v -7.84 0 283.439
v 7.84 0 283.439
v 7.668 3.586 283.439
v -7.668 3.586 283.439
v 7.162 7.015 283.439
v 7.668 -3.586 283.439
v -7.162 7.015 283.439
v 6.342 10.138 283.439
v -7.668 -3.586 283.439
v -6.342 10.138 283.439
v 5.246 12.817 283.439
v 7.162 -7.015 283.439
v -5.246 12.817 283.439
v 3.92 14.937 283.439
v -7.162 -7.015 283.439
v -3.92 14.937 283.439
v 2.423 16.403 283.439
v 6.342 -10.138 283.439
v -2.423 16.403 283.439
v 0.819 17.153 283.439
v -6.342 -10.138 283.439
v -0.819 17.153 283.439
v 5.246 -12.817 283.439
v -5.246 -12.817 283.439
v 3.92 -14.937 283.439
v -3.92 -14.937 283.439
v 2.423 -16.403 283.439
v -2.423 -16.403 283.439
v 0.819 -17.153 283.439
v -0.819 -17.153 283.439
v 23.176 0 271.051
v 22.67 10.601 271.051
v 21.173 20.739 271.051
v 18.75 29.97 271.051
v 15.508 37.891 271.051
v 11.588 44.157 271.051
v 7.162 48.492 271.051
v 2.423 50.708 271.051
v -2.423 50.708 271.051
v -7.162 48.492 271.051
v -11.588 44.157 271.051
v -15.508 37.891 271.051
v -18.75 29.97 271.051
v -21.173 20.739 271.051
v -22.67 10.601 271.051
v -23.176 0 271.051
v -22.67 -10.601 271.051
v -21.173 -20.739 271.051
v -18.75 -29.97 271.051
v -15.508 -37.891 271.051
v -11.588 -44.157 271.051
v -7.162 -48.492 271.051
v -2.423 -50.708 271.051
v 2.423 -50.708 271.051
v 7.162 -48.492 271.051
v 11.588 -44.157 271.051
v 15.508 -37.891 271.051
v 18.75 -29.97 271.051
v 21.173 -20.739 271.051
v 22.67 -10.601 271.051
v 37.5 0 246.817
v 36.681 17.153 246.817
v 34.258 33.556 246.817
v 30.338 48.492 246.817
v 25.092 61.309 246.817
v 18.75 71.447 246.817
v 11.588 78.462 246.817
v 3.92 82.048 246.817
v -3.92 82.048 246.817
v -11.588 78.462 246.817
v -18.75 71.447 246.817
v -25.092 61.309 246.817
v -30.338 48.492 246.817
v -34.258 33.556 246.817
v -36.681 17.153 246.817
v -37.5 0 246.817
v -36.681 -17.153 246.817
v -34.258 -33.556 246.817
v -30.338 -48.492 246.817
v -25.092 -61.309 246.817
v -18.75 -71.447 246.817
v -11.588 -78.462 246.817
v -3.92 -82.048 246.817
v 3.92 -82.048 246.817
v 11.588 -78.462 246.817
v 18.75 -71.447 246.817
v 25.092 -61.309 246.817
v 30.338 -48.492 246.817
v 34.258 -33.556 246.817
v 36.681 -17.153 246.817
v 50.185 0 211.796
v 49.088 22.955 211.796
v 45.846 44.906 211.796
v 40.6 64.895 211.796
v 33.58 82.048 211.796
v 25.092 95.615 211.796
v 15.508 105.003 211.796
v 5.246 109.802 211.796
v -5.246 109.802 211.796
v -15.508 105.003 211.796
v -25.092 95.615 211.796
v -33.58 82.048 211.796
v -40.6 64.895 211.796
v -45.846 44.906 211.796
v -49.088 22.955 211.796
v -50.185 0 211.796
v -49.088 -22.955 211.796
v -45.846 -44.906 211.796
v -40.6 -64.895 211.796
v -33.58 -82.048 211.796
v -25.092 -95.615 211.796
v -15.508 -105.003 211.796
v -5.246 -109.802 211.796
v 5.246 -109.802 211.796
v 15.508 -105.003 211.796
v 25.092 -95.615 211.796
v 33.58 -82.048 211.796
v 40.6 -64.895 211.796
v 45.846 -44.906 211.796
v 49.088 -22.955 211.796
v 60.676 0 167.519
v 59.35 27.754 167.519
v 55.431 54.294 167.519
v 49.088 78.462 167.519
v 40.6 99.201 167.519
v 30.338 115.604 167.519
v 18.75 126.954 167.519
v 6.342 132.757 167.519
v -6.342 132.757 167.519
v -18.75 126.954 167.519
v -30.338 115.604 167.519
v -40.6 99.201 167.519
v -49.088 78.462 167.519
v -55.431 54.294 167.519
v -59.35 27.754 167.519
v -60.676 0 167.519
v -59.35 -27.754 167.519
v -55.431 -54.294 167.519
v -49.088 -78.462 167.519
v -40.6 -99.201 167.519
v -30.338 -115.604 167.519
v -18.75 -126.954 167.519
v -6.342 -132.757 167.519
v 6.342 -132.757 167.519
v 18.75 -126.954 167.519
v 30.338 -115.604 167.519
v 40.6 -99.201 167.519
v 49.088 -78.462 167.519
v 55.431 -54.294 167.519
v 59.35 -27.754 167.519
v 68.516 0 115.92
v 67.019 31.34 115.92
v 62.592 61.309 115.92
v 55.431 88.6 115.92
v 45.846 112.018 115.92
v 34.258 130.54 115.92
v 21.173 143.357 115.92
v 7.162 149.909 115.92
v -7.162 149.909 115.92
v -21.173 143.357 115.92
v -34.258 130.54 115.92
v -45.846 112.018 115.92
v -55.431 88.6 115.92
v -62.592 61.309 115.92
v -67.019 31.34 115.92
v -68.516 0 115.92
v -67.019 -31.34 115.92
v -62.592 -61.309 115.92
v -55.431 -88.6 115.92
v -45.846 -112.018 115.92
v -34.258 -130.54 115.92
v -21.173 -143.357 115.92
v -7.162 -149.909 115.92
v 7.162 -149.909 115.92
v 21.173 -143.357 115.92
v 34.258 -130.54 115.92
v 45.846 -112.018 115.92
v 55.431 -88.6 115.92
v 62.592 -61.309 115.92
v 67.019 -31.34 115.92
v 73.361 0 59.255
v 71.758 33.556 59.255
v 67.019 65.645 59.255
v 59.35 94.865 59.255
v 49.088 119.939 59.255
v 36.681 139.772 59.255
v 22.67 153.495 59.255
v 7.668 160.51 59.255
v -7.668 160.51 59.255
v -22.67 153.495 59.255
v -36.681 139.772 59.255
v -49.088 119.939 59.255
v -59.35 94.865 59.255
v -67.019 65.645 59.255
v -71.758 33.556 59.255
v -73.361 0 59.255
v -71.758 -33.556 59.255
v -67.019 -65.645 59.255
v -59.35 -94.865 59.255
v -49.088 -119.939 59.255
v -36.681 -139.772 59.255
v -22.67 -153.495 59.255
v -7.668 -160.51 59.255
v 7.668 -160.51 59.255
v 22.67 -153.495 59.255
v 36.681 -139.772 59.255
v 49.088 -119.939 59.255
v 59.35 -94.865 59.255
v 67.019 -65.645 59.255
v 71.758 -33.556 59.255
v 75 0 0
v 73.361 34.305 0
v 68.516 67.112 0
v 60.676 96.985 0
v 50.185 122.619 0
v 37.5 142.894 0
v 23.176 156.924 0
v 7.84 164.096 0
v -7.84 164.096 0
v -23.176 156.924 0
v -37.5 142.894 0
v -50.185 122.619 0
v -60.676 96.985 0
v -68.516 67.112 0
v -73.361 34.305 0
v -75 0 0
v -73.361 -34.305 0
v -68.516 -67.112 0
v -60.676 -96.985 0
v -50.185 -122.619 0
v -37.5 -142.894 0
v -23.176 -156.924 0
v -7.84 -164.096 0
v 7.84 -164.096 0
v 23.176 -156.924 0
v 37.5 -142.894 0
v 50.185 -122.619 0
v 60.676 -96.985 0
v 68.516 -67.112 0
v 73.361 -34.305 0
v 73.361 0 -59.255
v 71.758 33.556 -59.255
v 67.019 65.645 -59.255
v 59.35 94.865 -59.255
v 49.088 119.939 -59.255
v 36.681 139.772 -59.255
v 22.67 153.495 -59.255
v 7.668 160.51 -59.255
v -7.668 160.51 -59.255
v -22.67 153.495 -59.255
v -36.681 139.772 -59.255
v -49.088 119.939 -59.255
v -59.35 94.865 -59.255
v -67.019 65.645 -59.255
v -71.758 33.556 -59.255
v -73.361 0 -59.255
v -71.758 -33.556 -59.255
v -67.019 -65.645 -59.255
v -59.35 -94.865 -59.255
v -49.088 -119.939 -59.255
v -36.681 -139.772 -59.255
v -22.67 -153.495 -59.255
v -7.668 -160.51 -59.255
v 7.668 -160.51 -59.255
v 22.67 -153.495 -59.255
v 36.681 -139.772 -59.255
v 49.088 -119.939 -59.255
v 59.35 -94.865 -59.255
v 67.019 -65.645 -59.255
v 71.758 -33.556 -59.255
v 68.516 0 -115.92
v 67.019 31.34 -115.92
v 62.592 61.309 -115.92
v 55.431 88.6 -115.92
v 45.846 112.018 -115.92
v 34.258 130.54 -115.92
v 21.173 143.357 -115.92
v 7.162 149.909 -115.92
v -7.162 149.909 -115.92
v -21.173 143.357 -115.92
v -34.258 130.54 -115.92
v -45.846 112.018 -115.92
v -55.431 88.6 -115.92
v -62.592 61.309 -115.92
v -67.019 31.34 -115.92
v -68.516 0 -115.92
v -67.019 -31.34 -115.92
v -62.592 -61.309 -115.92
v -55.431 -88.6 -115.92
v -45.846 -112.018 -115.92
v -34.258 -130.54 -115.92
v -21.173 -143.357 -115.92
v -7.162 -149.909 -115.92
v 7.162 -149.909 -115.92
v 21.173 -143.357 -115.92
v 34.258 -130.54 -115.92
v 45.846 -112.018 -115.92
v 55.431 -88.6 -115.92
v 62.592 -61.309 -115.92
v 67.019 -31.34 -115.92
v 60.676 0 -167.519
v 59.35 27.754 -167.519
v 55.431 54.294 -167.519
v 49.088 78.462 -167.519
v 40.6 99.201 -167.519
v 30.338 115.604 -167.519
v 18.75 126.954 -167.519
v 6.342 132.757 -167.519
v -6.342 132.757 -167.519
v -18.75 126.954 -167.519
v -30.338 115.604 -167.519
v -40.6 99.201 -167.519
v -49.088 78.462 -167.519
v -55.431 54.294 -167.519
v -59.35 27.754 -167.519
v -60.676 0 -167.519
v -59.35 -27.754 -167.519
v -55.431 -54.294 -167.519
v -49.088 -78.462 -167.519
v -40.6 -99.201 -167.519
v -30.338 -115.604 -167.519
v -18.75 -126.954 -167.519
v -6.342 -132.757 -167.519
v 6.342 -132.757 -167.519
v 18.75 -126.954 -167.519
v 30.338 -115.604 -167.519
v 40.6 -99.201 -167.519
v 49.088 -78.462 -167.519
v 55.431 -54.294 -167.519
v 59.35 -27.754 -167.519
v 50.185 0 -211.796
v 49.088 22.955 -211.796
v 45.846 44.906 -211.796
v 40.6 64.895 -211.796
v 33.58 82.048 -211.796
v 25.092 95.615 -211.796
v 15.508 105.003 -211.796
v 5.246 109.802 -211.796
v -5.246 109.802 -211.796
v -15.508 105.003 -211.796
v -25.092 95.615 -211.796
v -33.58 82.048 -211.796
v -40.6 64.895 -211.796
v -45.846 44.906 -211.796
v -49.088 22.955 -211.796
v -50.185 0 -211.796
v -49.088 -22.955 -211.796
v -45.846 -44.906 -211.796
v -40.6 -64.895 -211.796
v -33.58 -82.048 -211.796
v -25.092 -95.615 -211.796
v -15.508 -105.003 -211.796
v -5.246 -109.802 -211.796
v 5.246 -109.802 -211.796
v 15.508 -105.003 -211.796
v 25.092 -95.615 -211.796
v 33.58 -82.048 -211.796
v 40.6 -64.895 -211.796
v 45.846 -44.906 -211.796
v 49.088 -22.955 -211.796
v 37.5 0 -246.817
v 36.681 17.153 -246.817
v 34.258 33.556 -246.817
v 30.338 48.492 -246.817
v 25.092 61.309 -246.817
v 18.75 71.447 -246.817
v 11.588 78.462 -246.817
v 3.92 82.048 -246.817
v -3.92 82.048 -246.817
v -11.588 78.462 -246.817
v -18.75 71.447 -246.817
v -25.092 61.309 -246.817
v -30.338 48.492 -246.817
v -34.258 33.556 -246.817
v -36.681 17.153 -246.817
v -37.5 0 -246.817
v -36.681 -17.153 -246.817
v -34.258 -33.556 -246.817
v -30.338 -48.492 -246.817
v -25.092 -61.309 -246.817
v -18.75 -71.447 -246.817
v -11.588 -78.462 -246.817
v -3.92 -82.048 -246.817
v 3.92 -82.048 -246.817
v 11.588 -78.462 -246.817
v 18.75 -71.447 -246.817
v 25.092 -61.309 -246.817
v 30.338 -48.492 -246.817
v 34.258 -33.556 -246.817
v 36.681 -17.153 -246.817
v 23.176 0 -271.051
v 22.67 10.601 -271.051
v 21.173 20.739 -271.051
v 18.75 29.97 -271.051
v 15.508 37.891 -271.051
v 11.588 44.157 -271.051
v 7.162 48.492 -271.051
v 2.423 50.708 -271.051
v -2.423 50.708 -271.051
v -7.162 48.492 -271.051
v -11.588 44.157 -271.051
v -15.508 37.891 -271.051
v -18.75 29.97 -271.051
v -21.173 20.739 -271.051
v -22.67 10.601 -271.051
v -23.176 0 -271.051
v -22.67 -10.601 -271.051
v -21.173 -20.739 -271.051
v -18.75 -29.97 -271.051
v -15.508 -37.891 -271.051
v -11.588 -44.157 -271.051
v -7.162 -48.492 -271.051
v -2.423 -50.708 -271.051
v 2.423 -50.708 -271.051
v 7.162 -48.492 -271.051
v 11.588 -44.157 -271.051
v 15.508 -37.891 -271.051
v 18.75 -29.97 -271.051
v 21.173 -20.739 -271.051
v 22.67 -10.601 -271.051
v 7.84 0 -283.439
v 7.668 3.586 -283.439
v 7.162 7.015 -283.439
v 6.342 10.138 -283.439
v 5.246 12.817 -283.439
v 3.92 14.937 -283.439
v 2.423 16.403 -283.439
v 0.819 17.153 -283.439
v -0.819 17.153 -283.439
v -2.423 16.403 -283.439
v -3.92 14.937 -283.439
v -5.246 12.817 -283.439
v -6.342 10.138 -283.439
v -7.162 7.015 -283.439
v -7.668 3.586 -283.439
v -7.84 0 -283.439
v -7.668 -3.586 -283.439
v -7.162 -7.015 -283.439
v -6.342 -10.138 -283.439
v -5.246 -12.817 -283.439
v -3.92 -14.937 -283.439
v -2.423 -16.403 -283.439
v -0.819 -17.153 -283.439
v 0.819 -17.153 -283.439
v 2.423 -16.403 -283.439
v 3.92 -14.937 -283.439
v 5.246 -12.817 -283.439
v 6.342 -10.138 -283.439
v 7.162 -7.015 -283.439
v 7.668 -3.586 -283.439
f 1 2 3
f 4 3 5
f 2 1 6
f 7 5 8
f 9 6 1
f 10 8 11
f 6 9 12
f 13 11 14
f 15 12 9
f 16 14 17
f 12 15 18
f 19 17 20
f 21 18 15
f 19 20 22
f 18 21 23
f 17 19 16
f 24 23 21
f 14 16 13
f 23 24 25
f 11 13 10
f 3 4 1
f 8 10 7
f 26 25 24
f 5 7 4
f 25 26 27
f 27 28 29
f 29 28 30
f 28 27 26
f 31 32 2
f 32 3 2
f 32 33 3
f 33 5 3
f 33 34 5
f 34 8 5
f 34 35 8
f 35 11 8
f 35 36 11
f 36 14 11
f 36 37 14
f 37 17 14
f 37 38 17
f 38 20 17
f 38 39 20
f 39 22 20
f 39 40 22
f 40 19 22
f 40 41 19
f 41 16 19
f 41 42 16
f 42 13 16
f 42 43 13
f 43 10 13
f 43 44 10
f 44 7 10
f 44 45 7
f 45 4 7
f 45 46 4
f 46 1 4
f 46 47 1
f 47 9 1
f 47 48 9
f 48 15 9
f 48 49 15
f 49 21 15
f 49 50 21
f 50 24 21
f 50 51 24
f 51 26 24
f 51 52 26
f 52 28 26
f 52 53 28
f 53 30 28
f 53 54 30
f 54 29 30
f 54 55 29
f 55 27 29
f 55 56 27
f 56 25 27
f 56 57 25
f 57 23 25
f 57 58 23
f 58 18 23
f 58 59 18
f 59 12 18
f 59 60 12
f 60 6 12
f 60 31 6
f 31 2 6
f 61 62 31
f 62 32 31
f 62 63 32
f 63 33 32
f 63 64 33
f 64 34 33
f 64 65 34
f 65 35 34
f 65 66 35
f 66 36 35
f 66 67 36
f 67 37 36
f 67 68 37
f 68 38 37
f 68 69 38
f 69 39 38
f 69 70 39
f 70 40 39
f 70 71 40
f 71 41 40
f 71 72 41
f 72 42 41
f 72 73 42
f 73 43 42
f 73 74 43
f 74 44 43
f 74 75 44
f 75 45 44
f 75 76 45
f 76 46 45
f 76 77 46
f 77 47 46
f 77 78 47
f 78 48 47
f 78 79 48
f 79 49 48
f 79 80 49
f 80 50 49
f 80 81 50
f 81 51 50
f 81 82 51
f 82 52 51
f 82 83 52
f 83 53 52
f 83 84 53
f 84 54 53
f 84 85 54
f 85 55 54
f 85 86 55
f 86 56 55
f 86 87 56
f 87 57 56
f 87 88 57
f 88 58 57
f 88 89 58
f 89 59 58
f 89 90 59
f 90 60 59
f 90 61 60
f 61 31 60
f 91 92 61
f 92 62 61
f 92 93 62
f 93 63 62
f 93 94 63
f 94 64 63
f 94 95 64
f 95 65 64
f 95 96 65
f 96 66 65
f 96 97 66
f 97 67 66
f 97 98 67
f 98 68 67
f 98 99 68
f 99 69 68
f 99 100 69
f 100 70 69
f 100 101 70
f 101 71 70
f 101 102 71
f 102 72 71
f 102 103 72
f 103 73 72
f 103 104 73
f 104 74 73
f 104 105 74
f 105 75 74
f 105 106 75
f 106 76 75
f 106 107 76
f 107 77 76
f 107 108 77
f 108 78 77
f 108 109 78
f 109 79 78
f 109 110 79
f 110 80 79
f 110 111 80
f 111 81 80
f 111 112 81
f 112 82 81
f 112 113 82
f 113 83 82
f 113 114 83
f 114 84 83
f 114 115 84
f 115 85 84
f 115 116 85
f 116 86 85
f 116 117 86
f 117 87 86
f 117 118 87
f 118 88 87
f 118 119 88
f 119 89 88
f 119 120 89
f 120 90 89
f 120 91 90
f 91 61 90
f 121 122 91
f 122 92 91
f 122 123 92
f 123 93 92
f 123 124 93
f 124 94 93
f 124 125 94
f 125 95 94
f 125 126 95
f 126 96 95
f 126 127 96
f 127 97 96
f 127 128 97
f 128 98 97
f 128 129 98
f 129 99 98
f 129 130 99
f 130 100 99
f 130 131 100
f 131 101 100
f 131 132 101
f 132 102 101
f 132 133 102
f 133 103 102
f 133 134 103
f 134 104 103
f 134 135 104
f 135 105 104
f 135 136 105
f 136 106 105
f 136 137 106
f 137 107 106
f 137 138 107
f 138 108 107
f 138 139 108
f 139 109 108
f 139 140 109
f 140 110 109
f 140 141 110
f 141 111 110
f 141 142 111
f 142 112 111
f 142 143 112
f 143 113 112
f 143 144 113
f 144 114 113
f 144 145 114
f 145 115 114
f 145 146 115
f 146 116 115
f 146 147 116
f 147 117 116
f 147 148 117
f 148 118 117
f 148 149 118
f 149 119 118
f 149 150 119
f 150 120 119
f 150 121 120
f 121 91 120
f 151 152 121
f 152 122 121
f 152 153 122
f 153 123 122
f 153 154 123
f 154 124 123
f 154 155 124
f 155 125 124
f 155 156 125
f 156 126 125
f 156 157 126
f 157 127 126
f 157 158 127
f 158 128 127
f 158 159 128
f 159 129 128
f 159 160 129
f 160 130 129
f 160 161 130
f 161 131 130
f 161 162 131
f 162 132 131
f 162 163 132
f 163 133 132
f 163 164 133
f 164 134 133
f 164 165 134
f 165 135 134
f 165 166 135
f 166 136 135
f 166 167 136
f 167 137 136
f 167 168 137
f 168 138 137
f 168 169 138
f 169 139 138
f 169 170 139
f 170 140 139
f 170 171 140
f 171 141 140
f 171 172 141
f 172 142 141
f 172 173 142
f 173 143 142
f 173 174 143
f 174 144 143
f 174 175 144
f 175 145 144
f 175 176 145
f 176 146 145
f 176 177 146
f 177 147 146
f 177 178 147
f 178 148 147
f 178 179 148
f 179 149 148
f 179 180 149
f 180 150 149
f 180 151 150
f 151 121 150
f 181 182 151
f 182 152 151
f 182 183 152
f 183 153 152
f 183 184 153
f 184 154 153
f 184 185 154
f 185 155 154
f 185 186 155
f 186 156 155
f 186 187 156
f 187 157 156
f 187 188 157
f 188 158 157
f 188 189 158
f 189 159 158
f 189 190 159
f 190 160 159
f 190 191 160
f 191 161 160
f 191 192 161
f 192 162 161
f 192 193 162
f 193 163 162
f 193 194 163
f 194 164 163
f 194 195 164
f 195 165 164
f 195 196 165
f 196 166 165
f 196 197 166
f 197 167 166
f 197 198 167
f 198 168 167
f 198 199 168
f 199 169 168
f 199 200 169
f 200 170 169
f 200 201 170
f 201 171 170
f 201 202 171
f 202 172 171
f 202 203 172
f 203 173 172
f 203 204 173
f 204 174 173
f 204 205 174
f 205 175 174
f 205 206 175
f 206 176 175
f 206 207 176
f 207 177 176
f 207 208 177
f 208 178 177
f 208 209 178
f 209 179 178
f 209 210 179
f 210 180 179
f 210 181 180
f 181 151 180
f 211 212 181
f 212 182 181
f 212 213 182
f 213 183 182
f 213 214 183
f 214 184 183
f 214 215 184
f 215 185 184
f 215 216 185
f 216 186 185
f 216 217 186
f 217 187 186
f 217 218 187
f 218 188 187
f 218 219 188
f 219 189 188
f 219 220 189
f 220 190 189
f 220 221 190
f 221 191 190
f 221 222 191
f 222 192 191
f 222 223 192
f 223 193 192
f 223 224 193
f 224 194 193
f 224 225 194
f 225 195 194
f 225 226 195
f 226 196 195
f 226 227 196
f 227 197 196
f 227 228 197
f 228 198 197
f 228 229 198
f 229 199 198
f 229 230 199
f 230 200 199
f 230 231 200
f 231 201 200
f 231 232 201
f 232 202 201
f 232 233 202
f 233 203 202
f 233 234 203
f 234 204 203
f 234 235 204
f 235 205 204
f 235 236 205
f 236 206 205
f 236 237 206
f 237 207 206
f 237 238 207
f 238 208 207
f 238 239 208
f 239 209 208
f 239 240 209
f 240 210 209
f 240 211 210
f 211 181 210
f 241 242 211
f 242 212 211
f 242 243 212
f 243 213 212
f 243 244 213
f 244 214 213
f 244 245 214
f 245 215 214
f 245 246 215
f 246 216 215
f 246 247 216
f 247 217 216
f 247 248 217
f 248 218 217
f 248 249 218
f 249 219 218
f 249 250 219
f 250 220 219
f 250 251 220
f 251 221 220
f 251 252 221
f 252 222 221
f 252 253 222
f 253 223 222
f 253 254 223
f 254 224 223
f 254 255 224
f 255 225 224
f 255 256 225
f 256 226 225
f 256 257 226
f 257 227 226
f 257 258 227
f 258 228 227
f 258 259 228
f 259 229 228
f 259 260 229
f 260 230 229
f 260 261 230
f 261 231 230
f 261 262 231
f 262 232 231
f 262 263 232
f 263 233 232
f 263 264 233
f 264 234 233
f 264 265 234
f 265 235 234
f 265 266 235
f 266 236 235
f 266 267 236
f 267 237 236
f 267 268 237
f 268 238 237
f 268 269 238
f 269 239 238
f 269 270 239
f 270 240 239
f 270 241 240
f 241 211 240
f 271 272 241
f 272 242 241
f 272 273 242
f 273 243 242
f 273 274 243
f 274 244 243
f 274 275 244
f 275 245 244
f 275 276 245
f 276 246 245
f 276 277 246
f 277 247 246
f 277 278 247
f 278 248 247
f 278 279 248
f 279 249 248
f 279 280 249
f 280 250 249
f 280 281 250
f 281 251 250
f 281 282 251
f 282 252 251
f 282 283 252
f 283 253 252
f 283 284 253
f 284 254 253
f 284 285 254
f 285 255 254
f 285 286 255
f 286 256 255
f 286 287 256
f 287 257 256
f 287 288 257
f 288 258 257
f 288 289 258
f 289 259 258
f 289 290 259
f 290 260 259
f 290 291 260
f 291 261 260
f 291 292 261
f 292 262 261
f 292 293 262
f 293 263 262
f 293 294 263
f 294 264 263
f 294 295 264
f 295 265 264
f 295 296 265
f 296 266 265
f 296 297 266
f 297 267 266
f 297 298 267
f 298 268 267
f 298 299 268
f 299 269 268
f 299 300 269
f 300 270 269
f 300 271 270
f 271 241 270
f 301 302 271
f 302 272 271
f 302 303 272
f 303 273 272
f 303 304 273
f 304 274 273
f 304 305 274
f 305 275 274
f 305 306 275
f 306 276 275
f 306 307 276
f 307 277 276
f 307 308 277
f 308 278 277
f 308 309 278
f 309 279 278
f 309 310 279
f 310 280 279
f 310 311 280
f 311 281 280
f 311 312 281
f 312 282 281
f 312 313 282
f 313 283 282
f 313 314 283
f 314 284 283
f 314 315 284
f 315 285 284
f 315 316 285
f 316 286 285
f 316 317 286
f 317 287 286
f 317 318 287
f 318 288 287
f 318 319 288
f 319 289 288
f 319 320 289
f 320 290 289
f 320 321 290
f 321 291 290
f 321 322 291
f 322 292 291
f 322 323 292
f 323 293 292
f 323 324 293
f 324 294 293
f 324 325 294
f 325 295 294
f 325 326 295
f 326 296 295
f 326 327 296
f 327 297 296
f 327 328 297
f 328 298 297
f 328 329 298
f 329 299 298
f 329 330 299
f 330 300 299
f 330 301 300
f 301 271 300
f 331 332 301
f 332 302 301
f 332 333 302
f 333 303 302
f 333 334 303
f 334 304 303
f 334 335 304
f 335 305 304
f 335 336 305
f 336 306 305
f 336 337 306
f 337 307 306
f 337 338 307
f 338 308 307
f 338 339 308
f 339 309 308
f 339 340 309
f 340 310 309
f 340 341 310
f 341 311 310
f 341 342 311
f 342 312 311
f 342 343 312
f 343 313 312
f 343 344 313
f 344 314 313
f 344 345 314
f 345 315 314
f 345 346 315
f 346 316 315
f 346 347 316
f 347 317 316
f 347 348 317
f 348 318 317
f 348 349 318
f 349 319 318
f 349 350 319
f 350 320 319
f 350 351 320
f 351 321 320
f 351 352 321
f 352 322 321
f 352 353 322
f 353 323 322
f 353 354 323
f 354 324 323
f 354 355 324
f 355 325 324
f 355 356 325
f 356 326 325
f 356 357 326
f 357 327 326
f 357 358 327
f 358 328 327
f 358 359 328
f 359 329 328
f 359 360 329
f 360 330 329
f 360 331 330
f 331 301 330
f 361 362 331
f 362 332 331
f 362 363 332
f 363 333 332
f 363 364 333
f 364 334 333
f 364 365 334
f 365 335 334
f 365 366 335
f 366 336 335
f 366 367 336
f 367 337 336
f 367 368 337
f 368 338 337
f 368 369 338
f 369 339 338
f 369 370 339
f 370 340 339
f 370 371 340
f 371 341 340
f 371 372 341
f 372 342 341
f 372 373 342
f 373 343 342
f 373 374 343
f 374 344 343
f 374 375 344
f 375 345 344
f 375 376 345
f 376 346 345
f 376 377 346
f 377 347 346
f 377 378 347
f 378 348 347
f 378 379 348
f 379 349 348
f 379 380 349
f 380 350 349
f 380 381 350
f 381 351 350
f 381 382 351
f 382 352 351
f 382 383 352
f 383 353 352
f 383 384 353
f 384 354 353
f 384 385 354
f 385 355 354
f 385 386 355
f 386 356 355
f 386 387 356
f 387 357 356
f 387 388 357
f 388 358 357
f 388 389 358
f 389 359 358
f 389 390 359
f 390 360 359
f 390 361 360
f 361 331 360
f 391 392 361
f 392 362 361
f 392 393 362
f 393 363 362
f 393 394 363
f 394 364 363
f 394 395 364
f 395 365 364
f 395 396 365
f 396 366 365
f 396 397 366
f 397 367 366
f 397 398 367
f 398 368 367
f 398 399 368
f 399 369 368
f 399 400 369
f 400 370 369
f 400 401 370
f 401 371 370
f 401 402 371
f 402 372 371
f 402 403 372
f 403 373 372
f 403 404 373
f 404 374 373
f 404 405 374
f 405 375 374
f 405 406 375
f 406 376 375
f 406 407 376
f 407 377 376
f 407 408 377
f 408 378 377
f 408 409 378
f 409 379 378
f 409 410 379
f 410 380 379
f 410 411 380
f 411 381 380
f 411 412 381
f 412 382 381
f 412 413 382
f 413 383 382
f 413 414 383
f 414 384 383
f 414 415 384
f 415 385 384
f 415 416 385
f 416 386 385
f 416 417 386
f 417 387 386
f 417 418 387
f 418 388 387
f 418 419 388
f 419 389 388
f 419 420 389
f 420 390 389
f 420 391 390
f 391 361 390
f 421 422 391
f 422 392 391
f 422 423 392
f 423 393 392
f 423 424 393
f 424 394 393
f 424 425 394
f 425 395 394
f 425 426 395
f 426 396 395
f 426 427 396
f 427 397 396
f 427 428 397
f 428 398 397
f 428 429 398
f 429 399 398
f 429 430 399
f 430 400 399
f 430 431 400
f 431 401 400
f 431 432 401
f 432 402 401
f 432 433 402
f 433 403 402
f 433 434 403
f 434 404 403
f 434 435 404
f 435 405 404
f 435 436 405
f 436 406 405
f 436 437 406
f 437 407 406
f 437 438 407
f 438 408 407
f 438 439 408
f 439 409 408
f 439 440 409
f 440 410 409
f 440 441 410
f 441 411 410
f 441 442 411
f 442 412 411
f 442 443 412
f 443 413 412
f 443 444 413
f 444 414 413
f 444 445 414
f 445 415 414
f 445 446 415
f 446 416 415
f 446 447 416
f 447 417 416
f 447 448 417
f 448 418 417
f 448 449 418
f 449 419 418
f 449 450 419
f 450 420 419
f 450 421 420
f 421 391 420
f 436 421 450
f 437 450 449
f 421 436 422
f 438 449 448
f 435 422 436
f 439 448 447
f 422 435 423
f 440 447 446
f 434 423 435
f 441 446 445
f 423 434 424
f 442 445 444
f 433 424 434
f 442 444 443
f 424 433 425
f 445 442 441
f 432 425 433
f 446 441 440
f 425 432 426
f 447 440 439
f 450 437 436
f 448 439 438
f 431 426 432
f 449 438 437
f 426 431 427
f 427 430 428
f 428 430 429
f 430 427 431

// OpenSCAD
// Generated by SolidPython 1.0.1 on 2020-07-29 00:46:46


scale(v = [5, 11, 19]) {
	sphere(r = 15);
}
/***********************************************
*********      SolidPython code:      **********
************************************************
 
# import packages: SolidPython
from solid import *
from solid.utils import *
from itertools import chain, combinations, permutations


class Resize:

    def __init__(self, scad_file):
        self.scad_file = scad_file
        #self.scad_file = import_scad(scad_file)
        # cone/cylinder param:
        self.r1 = 0
        self.r2 = 0
        self.h = 0
        # rectangular prism param:
        self.w = 0
        self.l = 0
        # ellipse param:
        self.r = 0

    # import OpenScad code (file name corresponds to shape)


    # classify shape + parameters
    def assign(self, param1, param2, param3):
        if self.scad_file == 'cone.scad':
            self.r1 = param1
            self.r2 = param2
            self.h = param3
        elif self.scad_file == 'cylinder.scad':
            self.r1 = param1
            self.r2 = param2
            self.h = param3
        elif self.scad_file == 'rectangularPrism.scad':
            self.h = param1
            self.l = param2
            self.w = param3
        else:
            self.r = param1
            self.h = param2

    # resize parameters
    def iterate(self):
        x = range(3, 20, 2)
        i = 1
        if self.scad_file == 'cone.scad':
            tempList = list(permutations(x, 2))
            for temp in tempList:
                param1 = temp[0]
                param2 = temp[1]
                filepath = 'produced_scad_files/' + 'cone' + str(param1) + '_' + str(param2) + '_' + '.scad'
                scad_render_to_file(cylinder(h=param1, r1=param2, r2=0), filepath)

        elif self.scad_file == 'cylinder.scad':
            tempList = list(permutations(x, 3))
            for temp in tempList:
                param1 = temp[0]
                param2 = temp[1]
                filepath = 'produced_scad_files/' + 'cylinder' + str(param1) + '_' + str(param2) + '_' + '.scad'
                scad_render_to_file(cylinder(h=param1, r1=param2, r2=param2), filepath)

        elif self.scad_file == 'rectangularPrism.scad':
            tempList = list(permutations(x, 3))
            for temp in tempList:
                param1 = temp[0]
                param2 = temp[1]
                param3 = temp[2]
                filepath = 'produced_scad_files/' + 'rectangularPrism' + str(param1) + '_' + str(param2) + '_' + str(
                    param3) + '.scad'
                scad_render_to_file(cube(size=(param1, param2, param3)), filepath)

        elif self.scad_file == 'ellipse.scad':
            tempList = list(permutations(x, 4))
            for temp in tempList:
                param1 = temp[0]
                param2 = temp[1]
                param3 = temp[2]
                param4 = temp[3]
                filepath = 'produced_scad_files/' + 'ellipse' + str(param1) + '_' + str(param2) + '_' + str(param3) + '_' + str(param4) + '.scad'
                scad_render_to_file(scale([param1, param2, param3])(sphere(r=param4)), filepath)

    def render_to_scadfile(self):
        scad_render_to_file(scad, 'example.scad') 
 
************************************************/
